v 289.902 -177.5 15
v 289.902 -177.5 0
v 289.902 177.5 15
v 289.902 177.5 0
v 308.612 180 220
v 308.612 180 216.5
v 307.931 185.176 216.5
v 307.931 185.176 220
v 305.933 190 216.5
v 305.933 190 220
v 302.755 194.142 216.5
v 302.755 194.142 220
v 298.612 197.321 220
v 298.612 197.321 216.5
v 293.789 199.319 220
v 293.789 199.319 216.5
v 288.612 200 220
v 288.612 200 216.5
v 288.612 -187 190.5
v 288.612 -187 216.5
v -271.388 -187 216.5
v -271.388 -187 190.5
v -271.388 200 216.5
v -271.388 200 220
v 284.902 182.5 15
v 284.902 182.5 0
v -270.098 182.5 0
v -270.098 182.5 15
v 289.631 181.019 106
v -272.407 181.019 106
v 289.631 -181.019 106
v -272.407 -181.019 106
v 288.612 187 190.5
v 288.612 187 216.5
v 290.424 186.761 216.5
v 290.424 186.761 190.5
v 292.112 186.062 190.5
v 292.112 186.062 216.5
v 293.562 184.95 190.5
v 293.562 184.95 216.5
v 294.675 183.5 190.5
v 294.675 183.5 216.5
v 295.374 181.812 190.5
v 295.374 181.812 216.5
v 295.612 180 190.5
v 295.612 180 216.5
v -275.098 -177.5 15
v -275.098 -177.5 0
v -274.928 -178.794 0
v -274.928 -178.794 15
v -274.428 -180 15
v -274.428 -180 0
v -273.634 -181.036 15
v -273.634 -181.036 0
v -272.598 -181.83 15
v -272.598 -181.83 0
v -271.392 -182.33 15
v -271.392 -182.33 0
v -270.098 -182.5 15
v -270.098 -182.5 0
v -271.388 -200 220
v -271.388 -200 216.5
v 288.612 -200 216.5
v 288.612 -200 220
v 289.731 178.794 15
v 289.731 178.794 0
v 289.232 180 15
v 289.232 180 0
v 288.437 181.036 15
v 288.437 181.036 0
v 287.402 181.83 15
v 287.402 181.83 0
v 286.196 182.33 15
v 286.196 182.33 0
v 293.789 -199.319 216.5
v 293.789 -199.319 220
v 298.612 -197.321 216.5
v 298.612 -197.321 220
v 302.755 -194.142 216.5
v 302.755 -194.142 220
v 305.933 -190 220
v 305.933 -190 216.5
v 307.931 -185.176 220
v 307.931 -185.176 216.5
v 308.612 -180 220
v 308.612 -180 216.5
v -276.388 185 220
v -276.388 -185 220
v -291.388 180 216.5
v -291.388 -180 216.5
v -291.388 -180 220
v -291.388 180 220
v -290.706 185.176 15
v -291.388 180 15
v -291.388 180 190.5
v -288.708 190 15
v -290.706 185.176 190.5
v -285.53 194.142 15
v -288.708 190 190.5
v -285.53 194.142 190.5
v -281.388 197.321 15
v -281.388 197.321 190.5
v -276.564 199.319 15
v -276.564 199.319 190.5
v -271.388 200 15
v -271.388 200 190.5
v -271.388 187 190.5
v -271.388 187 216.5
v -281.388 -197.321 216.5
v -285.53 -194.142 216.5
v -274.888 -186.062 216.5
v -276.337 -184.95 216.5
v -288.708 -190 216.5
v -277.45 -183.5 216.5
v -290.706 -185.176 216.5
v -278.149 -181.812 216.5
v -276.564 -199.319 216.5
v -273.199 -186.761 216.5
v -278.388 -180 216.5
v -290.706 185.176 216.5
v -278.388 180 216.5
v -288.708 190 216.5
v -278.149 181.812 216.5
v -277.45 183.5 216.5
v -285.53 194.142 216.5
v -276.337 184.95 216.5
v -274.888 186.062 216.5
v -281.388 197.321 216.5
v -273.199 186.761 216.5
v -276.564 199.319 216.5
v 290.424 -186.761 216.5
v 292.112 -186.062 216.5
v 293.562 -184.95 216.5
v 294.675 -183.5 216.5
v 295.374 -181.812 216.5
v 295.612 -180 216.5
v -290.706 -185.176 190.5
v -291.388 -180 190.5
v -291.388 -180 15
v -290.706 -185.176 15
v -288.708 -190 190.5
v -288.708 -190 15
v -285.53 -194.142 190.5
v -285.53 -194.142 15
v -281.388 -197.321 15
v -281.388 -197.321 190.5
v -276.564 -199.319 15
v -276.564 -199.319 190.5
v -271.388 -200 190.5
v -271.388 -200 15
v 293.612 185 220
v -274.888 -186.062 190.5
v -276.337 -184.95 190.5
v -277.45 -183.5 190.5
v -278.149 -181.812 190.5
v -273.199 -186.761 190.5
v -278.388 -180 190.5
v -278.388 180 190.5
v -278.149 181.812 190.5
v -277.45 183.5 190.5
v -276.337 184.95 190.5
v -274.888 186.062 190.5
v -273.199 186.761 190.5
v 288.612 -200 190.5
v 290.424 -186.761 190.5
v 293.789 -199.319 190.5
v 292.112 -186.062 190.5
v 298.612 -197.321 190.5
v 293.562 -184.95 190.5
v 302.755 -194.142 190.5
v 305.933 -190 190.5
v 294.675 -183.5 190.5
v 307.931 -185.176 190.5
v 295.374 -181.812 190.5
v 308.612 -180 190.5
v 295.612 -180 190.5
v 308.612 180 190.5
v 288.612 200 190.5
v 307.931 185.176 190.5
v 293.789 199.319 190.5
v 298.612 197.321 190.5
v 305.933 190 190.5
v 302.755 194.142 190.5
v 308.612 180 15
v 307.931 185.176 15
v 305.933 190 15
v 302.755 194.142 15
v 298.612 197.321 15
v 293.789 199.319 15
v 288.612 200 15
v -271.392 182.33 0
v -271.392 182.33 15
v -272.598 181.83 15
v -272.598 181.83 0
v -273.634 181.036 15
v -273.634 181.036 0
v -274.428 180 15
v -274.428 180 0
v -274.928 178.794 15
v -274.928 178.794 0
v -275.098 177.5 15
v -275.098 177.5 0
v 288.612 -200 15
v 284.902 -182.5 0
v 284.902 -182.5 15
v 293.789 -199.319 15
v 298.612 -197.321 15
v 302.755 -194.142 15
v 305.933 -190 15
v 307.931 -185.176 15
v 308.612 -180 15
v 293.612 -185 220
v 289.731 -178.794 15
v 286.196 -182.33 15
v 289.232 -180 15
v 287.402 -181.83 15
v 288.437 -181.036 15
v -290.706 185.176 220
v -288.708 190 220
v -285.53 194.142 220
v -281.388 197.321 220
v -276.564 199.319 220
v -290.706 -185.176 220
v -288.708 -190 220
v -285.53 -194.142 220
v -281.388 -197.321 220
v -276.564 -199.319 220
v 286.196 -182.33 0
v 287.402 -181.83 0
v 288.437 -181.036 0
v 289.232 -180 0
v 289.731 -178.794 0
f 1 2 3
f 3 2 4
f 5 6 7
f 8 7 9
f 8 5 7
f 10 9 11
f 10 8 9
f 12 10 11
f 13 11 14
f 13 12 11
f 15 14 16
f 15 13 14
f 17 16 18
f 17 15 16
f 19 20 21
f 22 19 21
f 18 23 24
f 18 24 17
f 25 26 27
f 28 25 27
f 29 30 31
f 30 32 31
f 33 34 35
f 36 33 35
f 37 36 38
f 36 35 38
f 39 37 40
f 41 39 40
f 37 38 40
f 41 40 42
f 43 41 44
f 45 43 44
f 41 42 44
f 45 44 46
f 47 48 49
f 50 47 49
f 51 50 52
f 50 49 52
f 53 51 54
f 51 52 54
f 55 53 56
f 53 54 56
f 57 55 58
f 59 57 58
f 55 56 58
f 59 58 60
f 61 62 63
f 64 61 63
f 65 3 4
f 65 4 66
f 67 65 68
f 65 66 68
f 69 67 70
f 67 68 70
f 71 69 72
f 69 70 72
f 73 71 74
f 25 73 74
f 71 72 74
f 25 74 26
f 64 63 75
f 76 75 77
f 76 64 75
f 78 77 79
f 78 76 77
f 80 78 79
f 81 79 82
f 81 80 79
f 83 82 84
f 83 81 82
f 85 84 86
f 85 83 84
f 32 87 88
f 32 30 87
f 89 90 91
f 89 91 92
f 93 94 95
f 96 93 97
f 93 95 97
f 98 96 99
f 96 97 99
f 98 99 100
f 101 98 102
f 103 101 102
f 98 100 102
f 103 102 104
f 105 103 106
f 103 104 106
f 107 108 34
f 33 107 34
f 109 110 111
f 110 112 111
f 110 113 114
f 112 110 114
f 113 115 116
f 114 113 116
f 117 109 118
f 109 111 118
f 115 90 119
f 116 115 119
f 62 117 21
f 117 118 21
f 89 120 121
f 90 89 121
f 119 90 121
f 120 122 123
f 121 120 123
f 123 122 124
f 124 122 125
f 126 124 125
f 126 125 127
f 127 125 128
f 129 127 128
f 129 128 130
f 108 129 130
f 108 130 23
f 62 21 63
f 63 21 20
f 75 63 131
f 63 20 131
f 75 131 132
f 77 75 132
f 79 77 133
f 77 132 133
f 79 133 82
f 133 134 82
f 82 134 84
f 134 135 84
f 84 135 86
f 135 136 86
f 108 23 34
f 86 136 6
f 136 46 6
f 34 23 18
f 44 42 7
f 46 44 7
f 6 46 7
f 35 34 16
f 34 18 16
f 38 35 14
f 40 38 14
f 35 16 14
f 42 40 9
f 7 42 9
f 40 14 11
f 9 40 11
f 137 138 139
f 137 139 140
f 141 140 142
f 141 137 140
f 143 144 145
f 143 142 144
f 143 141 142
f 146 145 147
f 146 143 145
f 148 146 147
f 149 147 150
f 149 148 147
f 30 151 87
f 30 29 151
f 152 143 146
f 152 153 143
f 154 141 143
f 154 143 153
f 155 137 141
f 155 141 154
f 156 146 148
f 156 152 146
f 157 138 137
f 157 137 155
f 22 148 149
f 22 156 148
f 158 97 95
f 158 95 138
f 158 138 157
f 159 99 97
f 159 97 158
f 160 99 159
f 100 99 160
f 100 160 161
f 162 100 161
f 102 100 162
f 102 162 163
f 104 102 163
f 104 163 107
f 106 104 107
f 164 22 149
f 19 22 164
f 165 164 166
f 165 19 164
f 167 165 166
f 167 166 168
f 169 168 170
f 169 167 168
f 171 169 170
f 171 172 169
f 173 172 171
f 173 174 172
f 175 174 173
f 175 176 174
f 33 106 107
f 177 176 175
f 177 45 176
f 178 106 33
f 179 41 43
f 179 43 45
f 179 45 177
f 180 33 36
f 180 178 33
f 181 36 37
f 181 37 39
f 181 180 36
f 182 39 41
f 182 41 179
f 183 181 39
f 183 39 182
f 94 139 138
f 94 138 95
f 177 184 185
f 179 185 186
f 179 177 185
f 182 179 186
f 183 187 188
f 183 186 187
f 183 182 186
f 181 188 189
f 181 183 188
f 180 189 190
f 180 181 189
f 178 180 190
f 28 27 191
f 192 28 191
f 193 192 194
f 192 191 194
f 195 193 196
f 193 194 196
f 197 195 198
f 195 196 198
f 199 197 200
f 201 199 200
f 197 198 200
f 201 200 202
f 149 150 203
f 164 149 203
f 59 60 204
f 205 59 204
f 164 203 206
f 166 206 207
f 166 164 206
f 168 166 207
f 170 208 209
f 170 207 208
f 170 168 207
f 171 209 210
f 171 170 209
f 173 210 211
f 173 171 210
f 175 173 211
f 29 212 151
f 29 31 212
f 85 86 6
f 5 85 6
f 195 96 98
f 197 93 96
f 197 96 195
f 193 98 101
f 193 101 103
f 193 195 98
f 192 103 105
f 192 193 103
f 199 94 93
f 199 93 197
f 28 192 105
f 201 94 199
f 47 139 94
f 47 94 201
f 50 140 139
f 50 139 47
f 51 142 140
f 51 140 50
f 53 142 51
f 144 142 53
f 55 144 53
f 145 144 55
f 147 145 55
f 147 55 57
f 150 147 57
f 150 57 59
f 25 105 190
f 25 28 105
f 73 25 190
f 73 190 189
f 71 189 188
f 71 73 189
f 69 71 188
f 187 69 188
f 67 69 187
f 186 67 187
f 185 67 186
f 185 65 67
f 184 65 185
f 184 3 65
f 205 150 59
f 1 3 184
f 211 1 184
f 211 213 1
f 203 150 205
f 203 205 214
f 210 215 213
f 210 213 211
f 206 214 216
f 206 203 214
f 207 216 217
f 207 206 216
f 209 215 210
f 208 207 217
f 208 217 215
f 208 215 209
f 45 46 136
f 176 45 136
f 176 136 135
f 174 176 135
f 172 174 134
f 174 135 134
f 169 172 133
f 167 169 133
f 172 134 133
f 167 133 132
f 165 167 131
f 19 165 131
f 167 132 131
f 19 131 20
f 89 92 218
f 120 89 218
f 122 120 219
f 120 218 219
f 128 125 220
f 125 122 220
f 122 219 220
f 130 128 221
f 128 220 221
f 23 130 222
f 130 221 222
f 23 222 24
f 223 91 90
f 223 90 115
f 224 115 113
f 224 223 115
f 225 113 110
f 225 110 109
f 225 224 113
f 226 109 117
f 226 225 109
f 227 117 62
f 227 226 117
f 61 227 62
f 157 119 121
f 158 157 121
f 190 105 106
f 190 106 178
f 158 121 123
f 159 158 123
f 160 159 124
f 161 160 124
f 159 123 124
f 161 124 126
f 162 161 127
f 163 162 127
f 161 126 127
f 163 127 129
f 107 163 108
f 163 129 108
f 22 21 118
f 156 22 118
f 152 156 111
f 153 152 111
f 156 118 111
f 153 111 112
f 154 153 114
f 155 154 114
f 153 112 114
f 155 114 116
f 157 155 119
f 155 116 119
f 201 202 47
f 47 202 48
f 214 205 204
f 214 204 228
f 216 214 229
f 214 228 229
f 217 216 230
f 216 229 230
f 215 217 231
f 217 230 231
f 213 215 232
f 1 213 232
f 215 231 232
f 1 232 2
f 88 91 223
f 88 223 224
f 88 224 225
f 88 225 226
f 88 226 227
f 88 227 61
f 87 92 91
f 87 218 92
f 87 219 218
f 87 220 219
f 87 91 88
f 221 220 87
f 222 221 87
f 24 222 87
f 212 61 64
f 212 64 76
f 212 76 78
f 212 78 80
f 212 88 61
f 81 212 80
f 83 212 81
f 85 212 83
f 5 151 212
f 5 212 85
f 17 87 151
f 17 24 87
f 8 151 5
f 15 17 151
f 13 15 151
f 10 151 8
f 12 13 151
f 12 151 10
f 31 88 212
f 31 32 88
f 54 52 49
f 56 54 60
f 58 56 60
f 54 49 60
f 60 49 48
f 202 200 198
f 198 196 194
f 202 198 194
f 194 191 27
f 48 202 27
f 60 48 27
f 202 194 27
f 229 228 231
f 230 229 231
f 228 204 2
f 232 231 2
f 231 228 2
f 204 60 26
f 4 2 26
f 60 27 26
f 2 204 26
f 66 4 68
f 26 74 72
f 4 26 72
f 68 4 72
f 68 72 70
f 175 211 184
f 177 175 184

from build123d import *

# Parameters (mm, degrees)
F0_W     = 600
F0_H     = 400
F1_DEPTH = 220
F2_R     = 20
F4_DEPTH = 15
F7_DEPTH = 26
F8_W     = 570
F8_H     = 370
F9_DEPTH = 114
F9_TAPER = 2


with BuildPart() as f1:
    # F0 (on Top) → F1 (new body)
    with BuildSketch(Plane.XY):
        with Locations((8.6124254986, 0)):
            Rectangle(F0_W, F0_H)
    extrude(amount=F1_DEPTH)

    # F2
    f2_edges = [f1.edges().sort_by_distance(p)[0] for p in [
        (-291.387575, -200, 110),
        (308.612425, -200, 110),
        (308.612425, 200, 110),
        (-291.387575, 200, 110),
    ]]
    fillet(f2_edges, radius=F2_R)

    # F3 (on face) → F4 (cut)
    with BuildSketch(Plane(origin=(0, 0, 0), x_dir=(1, 0, 0), z_dir=(0, 0, -1))):
        with BuildLine():
            ThreePointArc((308.6124254986, 180), (302.7545611224, 194.1421356237), (288.6124254986, 200))
            Line((288.6124254986, 200), (-271.3875745014, 200))
            ThreePointArc((-271.3875745014, 200), (-285.5297101251, 194.1421356237), (-291.3875745014, 180))
            Line((-291.3875745014, 180), (-291.3875745014, -180))
            ThreePointArc((-291.3875745014, -180), (-285.5297101251, -194.1421356237), (-271.3875745014, -200))
            Line((-271.3875745014, -200), (288.6124254986, -200))
            ThreePointArc((288.6124254986, -200), (302.7545611224, -194.1421356237), (308.6124254986, -180))
            Line((308.6124254986, -180), (308.6124254986, 180))
        make_face()
        with BuildLine():
            ThreePointArc((-275.0983515568, 177.5), (-273.6338854627, 181.0355339059), (-270.0983515568, 182.5))
            Line((-270.0983515568, 182.5), (284.9016484432, 182.5))
            ThreePointArc((284.9016484432, 182.5), (288.4371823491, 181.0355339059), (289.9016484432, 177.5))
            Line((289.9016484432, 177.5), (289.9016484432, -177.5))
            ThreePointArc((289.9016484432, -177.5), (288.4371823491, -181.0355339059), (284.9016484432, -182.5))
            Line((284.9016484432, -182.5), (-270.0983515568, -182.5))
            ThreePointArc((-270.0983515568, -182.5), (-273.6338854627, -181.0355339059), (-275.0983515568, -177.5))
            Line((-275.0983515568, -177.5), (-275.0983515568, 177.5))
        make_face(mode=Mode.SUBTRACT)
    extrude(amount=-F4_DEPTH, mode=Mode.SUBTRACT)

    # F6 (on offset) → F7 (cut)
    with BuildSketch(Plane.XY.offset(216.5)):
        with BuildLine():
            ThreePointArc((-271.3875745014, 200), (-285.5297101251, 194.1421356237), (-291.3875745014, 180))
            Line((-291.3875745014, 180), (-291.3875745014, -180))
            ThreePointArc((-291.3875745014, -180), (-285.5297101251, -194.1421356237), (-271.3875745014, -200))
            Line((-271.3875745014, -200), (288.6124254986, -200))
            ThreePointArc((288.6124254986, -200), (302.7545611224, -194.1421356237), (308.6124254986, -180))
            Line((308.6124254986, -180), (308.6124254986, 180))
            ThreePointArc((308.6124254986, 180), (302.7545611224, 194.1421356237), (288.6124254986, 200))
            Line((288.6124254986, 200), (-271.3875745014, 200))
        make_face()
        with BuildLine():
            ThreePointArc((-278.3875745014, 180), (-276.3373219697, 184.9497474683), (-271.3875745014, 187))
            Line((-271.3875745014, 187), (288.6124254986, 187))
            ThreePointArc((288.6124254986, 187), (293.5621729669, 184.9497474683), (295.6124254986, 180))
            Line((295.6124254986, 180), (295.6124254986, -180))
            ThreePointArc((295.6124254986, -180), (293.5621729669, -184.9497474683), (288.6124254986, -187))
            Line((288.6124254986, -187), (-271.3875745014, -187))
            ThreePointArc((-271.3875745014, -187), (-276.3373219697, -184.9497474683), (-278.3875745014, -180))
            Line((-278.3875745014, -180), (-278.3875745014, 180))
        make_face(mode=Mode.SUBTRACT)
    extrude(amount=-F7_DEPTH, mode=Mode.SUBTRACT)

    # F8 (on face) → F9 (cut)
    with BuildSketch(Plane.XY.offset(220)):
        with Locations((8.6124254986, 0)):
            Rectangle(F8_W, F8_H)
    extrude(amount=-F9_DEPTH, taper=F9_TAPER, mode=Mode.SUBTRACT)


solid = f1.part
